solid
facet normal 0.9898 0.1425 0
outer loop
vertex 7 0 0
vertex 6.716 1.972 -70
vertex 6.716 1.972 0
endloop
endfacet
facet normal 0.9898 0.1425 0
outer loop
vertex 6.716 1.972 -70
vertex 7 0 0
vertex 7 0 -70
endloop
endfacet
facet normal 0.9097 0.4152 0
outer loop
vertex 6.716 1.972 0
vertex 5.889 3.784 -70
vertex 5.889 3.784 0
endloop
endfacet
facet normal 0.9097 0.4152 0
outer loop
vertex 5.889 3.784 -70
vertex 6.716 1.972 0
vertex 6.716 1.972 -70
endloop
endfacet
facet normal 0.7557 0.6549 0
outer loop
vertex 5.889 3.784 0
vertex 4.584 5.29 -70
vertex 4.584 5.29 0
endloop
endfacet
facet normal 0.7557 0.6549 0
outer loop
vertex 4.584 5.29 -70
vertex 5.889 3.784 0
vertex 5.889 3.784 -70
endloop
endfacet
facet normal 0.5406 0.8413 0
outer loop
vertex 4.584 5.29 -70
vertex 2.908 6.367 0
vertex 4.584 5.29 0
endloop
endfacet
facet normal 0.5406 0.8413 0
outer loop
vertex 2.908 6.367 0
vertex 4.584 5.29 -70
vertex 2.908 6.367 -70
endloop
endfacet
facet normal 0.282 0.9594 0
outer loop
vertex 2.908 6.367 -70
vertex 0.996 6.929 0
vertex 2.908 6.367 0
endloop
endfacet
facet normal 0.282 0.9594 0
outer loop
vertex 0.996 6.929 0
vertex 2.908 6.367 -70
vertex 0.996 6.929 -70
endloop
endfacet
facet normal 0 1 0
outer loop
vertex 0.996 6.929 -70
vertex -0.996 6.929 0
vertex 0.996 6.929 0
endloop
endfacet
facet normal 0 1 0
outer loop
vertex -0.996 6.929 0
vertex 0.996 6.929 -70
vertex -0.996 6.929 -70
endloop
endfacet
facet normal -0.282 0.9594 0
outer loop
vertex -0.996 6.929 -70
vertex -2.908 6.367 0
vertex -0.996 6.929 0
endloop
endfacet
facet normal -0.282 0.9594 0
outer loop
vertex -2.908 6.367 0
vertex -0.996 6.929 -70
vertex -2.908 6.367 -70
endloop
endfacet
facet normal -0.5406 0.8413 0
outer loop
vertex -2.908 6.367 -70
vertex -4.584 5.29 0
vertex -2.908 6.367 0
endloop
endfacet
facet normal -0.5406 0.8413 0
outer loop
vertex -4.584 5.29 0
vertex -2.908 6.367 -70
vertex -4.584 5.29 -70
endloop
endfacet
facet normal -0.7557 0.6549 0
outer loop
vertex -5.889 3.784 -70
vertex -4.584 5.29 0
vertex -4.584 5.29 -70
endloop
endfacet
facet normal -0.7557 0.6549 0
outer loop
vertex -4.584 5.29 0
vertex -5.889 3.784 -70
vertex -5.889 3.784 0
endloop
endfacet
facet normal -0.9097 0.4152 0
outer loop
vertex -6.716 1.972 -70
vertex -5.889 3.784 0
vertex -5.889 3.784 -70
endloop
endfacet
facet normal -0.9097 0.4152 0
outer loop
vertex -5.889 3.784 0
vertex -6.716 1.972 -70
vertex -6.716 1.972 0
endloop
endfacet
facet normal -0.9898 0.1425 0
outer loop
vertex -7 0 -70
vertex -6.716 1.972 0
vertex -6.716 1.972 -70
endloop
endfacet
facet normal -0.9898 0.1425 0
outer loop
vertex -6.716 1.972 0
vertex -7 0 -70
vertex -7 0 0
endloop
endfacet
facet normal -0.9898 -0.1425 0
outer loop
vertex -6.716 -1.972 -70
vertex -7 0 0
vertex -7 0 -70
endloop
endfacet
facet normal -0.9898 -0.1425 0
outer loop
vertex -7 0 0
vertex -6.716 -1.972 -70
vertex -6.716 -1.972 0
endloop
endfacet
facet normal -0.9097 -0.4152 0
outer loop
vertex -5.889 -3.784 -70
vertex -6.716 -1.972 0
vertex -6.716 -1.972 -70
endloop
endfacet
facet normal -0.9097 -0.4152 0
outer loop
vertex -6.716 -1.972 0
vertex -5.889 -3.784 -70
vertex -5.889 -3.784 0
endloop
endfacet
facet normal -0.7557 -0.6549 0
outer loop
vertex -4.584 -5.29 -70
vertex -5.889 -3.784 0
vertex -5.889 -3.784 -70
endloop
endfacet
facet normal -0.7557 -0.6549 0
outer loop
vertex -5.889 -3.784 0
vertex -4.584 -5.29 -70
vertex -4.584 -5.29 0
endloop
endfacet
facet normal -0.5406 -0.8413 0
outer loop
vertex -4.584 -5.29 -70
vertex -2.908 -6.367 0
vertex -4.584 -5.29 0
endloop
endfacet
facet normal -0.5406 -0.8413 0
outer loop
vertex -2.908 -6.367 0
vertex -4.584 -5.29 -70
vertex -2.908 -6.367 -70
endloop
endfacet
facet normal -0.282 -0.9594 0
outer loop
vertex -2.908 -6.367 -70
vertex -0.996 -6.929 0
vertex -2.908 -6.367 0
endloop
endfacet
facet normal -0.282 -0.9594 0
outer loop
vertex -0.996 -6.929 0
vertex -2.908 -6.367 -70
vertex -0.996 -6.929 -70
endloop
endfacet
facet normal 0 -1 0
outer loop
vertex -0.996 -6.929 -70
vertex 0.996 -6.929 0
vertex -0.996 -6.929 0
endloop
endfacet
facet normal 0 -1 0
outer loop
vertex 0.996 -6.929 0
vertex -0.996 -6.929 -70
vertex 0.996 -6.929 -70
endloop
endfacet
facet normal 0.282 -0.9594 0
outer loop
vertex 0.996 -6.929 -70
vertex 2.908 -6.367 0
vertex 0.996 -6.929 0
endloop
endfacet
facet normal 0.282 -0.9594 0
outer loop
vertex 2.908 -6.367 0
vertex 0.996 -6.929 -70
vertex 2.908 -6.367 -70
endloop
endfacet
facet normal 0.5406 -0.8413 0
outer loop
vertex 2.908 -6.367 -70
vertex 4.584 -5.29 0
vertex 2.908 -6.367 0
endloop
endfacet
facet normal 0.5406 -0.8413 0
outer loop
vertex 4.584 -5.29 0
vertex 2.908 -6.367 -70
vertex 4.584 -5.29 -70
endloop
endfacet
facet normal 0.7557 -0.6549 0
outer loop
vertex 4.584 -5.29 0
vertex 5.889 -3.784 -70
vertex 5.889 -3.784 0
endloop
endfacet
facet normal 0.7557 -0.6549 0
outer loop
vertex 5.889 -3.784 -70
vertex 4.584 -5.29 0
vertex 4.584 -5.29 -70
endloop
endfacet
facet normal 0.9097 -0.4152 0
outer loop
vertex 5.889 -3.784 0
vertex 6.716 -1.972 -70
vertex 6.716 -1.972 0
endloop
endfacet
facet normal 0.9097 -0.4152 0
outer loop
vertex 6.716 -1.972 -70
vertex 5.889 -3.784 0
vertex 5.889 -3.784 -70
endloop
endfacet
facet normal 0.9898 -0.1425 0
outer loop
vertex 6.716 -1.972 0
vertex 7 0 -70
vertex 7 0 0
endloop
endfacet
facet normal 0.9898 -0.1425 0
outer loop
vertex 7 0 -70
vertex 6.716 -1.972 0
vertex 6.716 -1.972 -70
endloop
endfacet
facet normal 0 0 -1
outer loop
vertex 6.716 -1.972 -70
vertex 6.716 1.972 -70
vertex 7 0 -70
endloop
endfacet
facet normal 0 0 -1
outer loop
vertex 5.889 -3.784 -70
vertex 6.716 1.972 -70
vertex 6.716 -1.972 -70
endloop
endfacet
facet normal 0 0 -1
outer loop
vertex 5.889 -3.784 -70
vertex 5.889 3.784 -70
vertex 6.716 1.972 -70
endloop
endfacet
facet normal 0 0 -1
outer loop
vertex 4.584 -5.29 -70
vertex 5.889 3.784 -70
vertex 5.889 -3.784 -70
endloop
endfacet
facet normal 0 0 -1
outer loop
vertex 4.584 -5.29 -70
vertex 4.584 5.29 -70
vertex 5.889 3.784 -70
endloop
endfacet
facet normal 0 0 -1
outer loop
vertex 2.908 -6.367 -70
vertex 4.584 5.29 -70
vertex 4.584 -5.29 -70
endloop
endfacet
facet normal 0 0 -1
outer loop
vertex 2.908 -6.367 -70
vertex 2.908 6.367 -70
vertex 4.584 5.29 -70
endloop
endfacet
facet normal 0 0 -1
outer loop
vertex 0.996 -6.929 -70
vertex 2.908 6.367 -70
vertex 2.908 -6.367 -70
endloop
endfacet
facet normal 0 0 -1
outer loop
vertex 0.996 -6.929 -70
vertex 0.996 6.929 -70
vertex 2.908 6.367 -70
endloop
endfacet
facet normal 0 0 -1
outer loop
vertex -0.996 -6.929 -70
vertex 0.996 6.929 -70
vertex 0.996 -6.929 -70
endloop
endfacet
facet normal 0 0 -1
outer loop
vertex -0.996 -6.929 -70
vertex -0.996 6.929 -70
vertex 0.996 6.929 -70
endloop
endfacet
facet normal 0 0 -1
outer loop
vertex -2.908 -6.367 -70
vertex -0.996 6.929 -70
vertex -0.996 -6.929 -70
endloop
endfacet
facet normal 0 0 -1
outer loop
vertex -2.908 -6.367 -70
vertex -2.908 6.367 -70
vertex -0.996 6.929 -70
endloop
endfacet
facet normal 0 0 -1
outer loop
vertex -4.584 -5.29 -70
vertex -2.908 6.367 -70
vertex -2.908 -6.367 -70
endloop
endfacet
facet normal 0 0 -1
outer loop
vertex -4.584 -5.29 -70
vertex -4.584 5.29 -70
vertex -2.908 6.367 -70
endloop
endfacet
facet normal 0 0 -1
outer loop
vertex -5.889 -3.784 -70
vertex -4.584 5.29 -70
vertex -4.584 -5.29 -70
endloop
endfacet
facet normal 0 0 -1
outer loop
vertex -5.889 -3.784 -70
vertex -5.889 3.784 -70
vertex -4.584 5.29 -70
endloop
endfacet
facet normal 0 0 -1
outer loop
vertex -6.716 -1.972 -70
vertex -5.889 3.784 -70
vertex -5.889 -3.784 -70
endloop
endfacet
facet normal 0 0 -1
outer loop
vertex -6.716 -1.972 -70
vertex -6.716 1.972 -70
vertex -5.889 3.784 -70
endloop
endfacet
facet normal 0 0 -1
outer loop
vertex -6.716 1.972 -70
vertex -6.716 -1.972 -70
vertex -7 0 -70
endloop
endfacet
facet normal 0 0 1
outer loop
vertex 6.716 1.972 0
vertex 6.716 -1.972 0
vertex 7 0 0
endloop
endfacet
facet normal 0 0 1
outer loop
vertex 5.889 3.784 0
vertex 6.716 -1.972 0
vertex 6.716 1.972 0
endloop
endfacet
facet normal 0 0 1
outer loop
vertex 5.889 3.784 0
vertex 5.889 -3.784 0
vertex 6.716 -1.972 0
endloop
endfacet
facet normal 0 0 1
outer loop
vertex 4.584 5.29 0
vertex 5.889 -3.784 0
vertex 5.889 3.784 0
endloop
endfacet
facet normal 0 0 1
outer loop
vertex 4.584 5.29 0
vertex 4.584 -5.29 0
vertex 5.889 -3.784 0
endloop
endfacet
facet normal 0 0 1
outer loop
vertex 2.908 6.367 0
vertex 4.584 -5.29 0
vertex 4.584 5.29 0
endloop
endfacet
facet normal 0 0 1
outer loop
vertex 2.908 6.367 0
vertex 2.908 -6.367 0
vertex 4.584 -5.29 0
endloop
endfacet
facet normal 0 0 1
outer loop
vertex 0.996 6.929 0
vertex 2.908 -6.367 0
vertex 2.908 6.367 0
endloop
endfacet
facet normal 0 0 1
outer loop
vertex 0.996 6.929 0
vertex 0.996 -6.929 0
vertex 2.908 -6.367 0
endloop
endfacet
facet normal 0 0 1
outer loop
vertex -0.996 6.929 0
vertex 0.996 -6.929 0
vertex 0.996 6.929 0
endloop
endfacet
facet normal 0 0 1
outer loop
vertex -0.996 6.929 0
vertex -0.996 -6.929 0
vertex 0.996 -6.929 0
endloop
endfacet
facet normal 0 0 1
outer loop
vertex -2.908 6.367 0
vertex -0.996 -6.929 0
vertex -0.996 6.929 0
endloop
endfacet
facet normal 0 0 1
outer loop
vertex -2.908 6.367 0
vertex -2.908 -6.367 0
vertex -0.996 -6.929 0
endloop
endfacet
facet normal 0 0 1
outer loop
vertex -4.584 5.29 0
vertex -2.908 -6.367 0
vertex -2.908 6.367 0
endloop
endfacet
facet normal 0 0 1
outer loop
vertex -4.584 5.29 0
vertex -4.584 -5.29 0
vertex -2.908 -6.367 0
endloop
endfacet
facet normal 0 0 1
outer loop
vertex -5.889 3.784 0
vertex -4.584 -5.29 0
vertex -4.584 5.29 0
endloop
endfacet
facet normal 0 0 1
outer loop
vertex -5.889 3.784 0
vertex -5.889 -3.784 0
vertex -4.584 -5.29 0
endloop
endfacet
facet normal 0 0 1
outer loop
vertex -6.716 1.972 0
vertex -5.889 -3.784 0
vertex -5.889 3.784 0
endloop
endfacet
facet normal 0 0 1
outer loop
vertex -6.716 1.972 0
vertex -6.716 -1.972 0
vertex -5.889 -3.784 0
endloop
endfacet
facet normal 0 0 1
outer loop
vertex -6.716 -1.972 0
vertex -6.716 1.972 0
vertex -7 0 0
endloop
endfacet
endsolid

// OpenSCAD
module pied_rond_long()
{
	translate([0,0,-35])
cylinder(h = 70, r1 = 7, r2 = 7, center = true);

}
pied_rond_long();
